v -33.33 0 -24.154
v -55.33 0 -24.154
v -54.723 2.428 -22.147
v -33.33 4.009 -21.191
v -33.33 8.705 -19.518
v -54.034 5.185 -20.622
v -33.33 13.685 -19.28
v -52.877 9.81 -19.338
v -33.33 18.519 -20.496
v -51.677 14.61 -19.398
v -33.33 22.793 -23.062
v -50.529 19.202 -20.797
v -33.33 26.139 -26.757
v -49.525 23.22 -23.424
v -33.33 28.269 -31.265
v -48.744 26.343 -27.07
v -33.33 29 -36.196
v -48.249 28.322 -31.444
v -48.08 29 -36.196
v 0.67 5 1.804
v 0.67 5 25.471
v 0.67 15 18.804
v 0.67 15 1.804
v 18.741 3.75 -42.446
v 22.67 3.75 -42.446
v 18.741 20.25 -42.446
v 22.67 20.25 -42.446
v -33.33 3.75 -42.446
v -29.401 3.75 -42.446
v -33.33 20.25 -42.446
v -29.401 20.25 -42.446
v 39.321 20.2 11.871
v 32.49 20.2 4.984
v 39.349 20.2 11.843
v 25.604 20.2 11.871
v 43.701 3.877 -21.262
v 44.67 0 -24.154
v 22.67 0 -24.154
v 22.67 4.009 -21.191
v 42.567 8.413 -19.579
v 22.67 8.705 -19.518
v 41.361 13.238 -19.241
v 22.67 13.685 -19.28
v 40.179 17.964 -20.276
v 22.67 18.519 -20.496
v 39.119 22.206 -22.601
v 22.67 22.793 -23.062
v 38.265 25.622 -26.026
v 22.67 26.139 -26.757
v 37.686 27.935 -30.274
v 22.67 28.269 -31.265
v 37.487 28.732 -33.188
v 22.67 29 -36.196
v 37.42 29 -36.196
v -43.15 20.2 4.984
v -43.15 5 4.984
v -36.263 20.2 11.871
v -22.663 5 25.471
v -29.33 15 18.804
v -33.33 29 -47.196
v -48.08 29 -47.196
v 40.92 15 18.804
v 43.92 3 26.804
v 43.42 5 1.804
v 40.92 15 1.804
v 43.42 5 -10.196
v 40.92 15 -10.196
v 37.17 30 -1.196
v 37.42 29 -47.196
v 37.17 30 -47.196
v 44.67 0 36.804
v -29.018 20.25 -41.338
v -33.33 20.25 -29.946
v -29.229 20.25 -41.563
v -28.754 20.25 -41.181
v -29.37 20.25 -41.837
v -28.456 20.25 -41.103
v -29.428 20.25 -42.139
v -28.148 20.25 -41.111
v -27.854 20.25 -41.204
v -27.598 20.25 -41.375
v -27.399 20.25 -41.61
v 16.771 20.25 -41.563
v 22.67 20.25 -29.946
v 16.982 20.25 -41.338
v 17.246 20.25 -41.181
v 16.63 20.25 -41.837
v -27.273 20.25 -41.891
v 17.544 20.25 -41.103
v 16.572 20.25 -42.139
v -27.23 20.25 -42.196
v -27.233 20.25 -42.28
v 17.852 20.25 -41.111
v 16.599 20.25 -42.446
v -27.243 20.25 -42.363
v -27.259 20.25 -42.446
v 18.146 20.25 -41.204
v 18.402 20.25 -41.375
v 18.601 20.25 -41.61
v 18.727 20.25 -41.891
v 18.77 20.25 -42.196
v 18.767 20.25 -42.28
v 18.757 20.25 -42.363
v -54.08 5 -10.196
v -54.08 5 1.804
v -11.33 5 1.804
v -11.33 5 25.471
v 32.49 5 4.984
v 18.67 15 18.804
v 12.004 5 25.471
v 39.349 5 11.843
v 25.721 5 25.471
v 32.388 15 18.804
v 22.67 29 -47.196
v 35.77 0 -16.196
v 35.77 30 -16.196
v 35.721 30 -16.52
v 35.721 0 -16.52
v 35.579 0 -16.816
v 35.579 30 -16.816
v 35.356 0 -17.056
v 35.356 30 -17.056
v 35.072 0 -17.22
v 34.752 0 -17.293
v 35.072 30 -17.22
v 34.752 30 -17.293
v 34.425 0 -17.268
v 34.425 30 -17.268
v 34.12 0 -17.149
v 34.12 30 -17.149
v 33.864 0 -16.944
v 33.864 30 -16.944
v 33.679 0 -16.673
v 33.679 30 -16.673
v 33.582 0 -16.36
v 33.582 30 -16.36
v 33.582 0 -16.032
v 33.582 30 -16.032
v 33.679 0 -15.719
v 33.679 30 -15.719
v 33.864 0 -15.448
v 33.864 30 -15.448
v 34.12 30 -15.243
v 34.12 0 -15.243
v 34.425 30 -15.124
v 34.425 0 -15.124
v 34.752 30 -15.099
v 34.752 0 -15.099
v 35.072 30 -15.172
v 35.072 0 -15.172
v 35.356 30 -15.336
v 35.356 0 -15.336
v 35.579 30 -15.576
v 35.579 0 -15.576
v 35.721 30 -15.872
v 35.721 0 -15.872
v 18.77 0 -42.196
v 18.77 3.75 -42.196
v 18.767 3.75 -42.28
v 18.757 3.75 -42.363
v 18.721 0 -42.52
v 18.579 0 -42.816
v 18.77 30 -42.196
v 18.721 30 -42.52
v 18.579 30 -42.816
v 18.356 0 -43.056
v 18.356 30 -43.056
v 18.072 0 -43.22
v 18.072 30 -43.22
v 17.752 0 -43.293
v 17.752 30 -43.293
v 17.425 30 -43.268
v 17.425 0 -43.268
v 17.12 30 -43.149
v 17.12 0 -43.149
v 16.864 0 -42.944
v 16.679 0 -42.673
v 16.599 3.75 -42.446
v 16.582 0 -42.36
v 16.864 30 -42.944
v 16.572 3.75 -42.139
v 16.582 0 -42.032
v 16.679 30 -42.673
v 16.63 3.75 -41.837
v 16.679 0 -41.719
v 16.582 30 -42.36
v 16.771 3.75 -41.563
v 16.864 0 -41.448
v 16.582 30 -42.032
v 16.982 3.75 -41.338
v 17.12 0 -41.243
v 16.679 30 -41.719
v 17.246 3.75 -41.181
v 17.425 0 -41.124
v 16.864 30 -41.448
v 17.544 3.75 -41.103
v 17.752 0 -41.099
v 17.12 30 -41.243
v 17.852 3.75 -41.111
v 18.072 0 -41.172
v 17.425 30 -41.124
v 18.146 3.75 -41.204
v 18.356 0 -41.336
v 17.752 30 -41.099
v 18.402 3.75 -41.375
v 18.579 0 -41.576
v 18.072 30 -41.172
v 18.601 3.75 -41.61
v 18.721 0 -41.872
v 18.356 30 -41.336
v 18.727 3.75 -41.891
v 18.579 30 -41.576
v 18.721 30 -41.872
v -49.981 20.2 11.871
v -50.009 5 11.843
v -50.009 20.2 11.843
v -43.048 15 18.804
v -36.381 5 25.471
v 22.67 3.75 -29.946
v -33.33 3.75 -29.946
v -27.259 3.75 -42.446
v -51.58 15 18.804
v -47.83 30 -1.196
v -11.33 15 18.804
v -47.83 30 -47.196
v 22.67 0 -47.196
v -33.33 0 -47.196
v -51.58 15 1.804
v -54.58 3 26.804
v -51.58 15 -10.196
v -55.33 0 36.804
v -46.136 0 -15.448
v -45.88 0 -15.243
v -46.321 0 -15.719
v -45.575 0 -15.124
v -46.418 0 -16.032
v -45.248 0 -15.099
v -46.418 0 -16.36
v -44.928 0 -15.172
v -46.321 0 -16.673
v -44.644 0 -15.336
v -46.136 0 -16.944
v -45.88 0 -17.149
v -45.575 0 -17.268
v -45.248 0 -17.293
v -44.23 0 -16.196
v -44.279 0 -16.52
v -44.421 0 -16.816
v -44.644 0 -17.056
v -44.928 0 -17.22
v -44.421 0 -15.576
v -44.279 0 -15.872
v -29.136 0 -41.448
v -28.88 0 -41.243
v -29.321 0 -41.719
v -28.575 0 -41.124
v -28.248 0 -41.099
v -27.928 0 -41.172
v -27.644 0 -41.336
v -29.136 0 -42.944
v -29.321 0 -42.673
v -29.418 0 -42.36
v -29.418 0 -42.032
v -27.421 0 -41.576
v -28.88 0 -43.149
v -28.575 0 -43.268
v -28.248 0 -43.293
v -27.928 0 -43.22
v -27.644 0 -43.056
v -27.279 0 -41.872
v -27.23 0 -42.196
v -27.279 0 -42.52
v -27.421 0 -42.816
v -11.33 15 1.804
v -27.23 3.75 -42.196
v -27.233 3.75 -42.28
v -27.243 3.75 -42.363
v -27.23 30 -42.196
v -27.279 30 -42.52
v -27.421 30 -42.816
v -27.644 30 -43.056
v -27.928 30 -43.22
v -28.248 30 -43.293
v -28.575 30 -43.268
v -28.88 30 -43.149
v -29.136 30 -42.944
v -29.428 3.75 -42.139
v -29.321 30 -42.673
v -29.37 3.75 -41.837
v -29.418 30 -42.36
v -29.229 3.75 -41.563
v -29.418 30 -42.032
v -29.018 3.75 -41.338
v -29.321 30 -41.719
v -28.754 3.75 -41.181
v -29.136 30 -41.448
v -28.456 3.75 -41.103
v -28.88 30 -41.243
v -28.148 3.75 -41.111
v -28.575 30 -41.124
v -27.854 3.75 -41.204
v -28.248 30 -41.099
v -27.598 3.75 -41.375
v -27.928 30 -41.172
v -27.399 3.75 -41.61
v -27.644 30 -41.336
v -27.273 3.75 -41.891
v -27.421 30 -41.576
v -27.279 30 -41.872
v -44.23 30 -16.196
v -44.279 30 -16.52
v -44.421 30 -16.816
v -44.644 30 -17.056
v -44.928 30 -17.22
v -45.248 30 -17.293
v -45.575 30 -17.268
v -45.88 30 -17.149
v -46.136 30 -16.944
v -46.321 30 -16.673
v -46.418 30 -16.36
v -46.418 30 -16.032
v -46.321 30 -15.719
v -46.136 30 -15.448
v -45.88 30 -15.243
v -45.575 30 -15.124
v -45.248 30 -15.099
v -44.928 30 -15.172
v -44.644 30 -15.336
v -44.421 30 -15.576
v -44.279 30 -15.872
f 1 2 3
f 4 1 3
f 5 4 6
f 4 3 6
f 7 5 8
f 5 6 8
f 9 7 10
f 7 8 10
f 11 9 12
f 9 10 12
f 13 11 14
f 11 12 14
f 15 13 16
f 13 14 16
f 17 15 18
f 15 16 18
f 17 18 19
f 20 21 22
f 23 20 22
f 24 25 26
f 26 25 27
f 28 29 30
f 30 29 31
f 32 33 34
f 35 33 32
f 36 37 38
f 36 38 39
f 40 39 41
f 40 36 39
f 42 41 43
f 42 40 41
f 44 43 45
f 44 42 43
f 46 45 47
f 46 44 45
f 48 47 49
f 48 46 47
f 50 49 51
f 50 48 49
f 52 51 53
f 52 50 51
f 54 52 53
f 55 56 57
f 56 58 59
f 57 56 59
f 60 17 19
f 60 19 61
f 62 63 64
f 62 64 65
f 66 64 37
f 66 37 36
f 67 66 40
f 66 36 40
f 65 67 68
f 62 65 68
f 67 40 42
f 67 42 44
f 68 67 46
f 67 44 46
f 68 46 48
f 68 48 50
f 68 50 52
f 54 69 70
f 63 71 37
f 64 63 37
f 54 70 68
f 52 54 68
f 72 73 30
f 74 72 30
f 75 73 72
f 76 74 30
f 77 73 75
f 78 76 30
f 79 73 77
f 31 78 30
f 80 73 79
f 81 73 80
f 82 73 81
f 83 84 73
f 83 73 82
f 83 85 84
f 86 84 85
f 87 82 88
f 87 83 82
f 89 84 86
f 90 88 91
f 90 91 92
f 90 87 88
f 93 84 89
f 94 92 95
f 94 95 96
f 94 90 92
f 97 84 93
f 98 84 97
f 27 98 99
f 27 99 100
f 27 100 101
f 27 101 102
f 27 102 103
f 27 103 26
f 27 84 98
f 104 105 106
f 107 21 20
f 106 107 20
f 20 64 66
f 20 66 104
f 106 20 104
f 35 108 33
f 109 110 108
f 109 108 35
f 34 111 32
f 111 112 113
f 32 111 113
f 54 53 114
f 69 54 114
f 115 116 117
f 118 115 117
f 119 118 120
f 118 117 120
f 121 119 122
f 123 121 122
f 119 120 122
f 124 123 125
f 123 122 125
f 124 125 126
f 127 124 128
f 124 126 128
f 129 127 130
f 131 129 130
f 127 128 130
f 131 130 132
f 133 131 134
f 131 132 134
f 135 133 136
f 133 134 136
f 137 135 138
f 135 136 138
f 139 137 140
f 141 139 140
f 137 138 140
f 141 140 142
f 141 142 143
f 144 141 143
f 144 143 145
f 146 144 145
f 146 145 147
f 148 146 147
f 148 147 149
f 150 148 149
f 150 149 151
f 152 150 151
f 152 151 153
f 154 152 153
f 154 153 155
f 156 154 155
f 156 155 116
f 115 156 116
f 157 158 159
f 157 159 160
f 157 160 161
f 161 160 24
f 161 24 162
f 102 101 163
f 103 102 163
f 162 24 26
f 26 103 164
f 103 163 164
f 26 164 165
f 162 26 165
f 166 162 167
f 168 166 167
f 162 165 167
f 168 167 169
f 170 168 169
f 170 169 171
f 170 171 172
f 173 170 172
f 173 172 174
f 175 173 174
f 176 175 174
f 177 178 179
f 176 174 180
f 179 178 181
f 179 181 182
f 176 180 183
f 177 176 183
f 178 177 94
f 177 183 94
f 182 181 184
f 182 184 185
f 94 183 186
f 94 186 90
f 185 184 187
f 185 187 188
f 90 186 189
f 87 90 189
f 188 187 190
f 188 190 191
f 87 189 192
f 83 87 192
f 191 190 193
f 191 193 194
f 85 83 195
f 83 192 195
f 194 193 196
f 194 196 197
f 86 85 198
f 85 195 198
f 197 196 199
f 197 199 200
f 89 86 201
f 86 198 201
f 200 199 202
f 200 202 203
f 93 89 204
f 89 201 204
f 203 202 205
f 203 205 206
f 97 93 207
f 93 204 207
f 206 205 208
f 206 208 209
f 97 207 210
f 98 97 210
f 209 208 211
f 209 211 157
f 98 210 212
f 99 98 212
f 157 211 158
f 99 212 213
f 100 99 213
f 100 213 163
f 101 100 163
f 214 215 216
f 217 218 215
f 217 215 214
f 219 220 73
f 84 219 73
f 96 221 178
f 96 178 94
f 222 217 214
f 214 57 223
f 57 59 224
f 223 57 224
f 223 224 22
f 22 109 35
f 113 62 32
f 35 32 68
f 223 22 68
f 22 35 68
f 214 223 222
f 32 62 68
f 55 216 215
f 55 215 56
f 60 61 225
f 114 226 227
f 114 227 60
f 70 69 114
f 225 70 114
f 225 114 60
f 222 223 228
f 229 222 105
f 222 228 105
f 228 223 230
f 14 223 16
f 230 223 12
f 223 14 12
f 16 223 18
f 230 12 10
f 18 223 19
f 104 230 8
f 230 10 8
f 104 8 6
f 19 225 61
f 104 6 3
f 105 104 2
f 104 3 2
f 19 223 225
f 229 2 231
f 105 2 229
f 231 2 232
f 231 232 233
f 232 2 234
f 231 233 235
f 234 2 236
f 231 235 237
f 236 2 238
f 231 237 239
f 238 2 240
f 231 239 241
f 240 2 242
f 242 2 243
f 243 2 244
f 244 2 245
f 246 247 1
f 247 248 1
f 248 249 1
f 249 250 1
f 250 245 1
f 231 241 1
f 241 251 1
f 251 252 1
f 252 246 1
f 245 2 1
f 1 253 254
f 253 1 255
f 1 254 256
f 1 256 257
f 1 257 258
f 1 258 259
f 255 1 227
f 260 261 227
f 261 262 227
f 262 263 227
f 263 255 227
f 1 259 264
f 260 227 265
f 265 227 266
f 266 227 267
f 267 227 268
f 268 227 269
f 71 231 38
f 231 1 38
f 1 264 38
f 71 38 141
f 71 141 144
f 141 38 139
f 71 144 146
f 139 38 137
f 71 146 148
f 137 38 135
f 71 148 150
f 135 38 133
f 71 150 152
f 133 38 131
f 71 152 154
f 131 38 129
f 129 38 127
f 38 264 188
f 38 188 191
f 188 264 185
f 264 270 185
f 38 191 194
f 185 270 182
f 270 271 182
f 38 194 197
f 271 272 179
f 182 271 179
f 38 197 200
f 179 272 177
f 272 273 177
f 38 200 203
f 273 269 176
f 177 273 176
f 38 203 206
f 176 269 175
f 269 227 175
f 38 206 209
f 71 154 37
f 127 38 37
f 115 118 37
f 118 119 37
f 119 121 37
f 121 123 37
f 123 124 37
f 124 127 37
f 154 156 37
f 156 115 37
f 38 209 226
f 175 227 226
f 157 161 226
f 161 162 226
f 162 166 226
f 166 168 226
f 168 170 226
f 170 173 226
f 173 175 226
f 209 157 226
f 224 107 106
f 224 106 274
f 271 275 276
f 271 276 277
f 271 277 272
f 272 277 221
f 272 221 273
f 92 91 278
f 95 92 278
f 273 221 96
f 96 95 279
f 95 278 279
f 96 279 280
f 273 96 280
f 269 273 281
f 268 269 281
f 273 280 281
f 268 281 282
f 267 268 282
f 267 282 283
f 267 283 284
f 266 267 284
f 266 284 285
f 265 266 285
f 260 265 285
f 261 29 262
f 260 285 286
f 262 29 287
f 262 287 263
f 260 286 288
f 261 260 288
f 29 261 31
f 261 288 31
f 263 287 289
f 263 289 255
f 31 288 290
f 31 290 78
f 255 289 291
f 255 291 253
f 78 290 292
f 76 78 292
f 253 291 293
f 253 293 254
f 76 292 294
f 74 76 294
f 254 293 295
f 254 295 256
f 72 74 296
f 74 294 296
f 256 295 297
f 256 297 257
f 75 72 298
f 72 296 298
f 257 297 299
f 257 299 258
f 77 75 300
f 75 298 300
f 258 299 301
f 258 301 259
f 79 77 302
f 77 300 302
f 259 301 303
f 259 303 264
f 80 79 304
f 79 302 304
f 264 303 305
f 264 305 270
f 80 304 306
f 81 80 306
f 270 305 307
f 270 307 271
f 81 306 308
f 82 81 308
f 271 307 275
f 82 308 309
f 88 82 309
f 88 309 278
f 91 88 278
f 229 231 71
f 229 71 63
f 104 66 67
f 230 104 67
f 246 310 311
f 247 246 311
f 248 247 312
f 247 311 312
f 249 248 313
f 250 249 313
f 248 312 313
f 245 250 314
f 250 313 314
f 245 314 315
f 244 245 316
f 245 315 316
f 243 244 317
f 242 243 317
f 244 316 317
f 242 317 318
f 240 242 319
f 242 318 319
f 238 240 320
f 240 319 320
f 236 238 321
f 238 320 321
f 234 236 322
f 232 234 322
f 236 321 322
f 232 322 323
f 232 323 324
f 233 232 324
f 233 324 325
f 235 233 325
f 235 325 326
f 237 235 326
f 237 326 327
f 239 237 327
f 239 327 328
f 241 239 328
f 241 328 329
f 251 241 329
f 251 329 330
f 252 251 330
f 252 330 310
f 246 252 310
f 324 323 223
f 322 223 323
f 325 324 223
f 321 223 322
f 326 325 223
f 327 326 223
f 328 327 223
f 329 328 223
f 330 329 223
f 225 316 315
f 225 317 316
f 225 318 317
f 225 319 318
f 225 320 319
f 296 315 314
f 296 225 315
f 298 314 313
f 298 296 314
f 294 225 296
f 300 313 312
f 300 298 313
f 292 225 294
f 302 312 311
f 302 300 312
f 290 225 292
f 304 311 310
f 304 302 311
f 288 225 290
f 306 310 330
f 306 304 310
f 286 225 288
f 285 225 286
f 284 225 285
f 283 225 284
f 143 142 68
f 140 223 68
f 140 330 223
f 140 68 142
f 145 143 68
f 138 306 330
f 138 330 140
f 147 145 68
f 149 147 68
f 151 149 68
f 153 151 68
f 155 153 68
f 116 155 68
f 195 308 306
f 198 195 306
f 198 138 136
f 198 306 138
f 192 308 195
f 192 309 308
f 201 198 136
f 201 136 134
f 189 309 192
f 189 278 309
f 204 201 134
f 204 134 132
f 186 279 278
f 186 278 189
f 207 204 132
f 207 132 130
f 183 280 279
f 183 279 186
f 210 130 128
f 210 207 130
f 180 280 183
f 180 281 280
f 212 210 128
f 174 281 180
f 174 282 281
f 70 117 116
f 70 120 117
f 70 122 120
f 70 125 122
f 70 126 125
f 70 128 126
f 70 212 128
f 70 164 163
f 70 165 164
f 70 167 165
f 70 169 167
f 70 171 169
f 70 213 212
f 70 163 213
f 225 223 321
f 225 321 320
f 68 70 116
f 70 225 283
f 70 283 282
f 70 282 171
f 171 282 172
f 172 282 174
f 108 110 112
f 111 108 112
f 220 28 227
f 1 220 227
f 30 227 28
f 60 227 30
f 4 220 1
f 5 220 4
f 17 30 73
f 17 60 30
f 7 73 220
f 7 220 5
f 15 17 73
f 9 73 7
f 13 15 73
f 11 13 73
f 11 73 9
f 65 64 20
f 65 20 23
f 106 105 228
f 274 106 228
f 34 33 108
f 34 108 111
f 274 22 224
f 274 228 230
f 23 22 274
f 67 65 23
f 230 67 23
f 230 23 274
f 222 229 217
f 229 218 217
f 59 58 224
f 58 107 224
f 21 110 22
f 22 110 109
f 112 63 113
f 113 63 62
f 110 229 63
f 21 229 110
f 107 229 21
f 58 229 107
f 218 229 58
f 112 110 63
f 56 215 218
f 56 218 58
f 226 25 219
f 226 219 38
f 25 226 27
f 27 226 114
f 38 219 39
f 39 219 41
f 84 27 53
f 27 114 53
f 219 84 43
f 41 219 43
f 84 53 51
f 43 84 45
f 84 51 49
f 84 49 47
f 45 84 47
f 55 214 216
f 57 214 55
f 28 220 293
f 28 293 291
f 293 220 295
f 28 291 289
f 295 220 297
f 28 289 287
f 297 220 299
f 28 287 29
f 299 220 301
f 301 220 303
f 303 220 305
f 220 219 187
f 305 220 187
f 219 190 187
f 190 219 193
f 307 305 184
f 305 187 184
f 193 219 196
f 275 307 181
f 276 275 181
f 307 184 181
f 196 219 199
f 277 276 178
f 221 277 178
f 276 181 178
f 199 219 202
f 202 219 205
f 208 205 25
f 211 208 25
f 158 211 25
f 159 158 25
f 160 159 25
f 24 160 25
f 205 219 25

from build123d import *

# Parameters (mm, degrees)
IZIM2_W                       = 100
IZIM2_H                       = 90
Y_KSEKLIK_EKSTR_ZYON1_DEPTH   = 30
KES_EKSTR_ZYON11_DEPTH        = 22
KES_EKSTR_ZYON12_DEPTH        = 22
IZIM7_W                       = 12.5
IZIM7_H                       = 16.5
KES_EKSTR_ZYON13_DEPTH        = 70
IZIM8_W                       = 6
IZIM8_H                       = 30
KES_EKSTR_ZYON14_DEPTH        = 100
IZIM9_W                       = 22
IZIM9_H                       = 6
KES_EKSTR_ZYON15_DEPTH        = 100
IZIM10_W                      = 12
IZIM10_H                      = 10
KES_EKSTR_ZYON16_DEPTH        = 100
IZIM11_W                      = 12
IZIM11_H                      = 10
KES_EKSTR_ZYON17_DEPTH        = 45
Y_KSEKLIK_EKSTR_ZYON2_DEPTH   = 45
Y_KSEKLIK_EKSTR_ZYON2_2_DEPTH = 45
IZIM13_W                      = 9.7
IZIM13_H                      = 15.2
KES_EKSTR_ZYON18_DEPTH        = 45
IZIM14_W                      = 9.7
IZIM14_H                      = 15.2
KES_EKSTR_ZYON19_DEPTH        = 45
IZIM15_W                      = 64.648209686
IZIM15_H                      = 50.718484946
KES_EKSTR_ZYON20_DEPTH        = 45
KES_EKSTR_ZYON21_DEPTH        = 100
IZIM17_R                      = 1.1
KES_EKSTR_ZYON24_DEPTH        = 100
KES_EKSTR_ZYON25_DEPTH        = 100


with BuildPart() as part:
    # Çizim2 → Yükseklik-Ekstrüzyon1 (new body)
    with BuildSketch(Plane(origin=(0, 0, 0), x_dir=(1, 0, 0), z_dir=(0, 1, 0))):
        with Locations((-5.3298184, 8.1959709)):
            Rectangle(IZIM2_W, IZIM2_H)
    extrude(amount=Y_KSEKLIK_EKSTR_ZYON1_DEPTH)

    # Çizim5 → Kes-Ekstrüzyon11 (cut)
    with BuildSketch(Plane(origin=(44.6701816, 0, 0), x_dir=(0, 0, -1), z_dir=(1, 0, 0))):
        with BuildLine():
            Line((36.1959709, 29), (53.1959709, 29))
            Line((53.1959709, 29), (53.1959709, 0))
            Line((53.1959709, 0), (24.154376321, 0))
            ThreePointArc((24.154376321, 0), (20.495652432, 18.519202405), (36.1959709, 29))
        make_face()
    extrude(amount=-KES_EKSTR_ZYON11_DEPTH, mode=Mode.SUBTRACT)

    # Çizim6 → Kes-Ekstrüzyon12 (cut)
    with BuildSketch(Plane.ZY.offset(55.3298184)):
        with BuildLine():
            Line((-36.1959709, 29), (-53.1959709, 29))
            Line((-53.1959709, 29), (-53.1959709, 0))
            Line((-53.1959709, 0), (-24.154376321, 0))
            ThreePointArc((-24.154376321, 0), (-20.495652432, 18.519202405), (-36.1959709, 29))
        make_face()
    extrude(amount=-KES_EKSTR_ZYON12_DEPTH, mode=Mode.SUBTRACT)

    # Çizim7 → Kes-Ekstrüzyon13 (cut)
    with BuildSketch(Plane(origin=(22.6701816, 0, 0), x_dir=(0, 0, -1), z_dir=(1, 0, 0))):
        with Locations((36.1959709, 12)):
            Rectangle(IZIM7_W, IZIM7_H)
    extrude(amount=-KES_EKSTR_ZYON13_DEPTH, mode=Mode.SUBTRACT)

    # Çizim8 → Kes-Ekstrüzyon14 (cut)
    with BuildSketch(Plane(origin=(22.6701816, 0, 0), x_dir=(0, 0, -1), z_dir=(1, 0, 0))):
        with Locations((50.1959709, 15)):
            Rectangle(IZIM8_W, IZIM8_H)
    extrude(amount=-KES_EKSTR_ZYON14_DEPTH, mode=Mode.SUBTRACT)

    # Çizim9 → Kes-Ekstrüzyon15 (cut)
    with BuildSketch(Plane(origin=(0, 30, 0), x_dir=(1, 0, 0), z_dir=(0, 1, 0))):
        with Locations((33.6701816, 50.1959709)):
            Rectangle(IZIM9_W, IZIM9_H)
    extrude(amount=-KES_EKSTR_ZYON15_DEPTH, mode=Mode.SUBTRACT)

    # Çizim10 → Kes-Ekstrüzyon16 (cut)
    with BuildSketch(Plane(origin=(44.6701816, 0, 0), x_dir=(0, 0, -1), z_dir=(1, 0, 0))):
        with Locations((4.1959709, 10)):
            Rectangle(IZIM10_W, IZIM10_H)
    extrude(amount=-KES_EKSTR_ZYON16_DEPTH, mode=Mode.SUBTRACT)

    # Çizim11 → Kes-Ekstrüzyon17 (cut)
    with BuildSketch(Plane.XY.offset(36.8040291)):
        with Locations((-5.3298184, 10)):
            Rectangle(IZIM11_W, IZIM11_H)
    extrude(amount=-KES_EKSTR_ZYON17_DEPTH, mode=Mode.SUBTRACT)

    # Çizim13 → Kes-Ekstrüzyon18 (cut)
    with BuildSketch(Plane(origin=(12.73710535, 0, 12.73710535), x_dir=(0.707106781, 0, -0.707106781), z_dir=(0.707106781, 0, 0.707106781))):
        with Locations((-38.885769972, 12.6)):
            Rectangle(IZIM13_W, IZIM13_H)
    extrude(amount=-KES_EKSTR_ZYON18_DEPTH, mode=Mode.SUBTRACT)

    # Çizim14 → Kes-Ekstrüzyon19 (cut)
    with BuildSketch(Plane(origin=(-18.06692375, 0, 18.06692375), x_dir=(0.707106781, 0, 0.707106781), z_dir=(-0.707106781, 0, 0.707106781))):
        with Locations((31.348268505, 12.6)):
            Rectangle(IZIM14_W, IZIM14_H)
    extrude(amount=-KES_EKSTR_ZYON19_DEPTH, mode=Mode.SUBTRACT)

    # Çizim16 → Kes-Ekstrüzyon21 (cut)
    with BuildSketch(Plane(origin=(44.6701816, 0, 0), x_dir=(0, 0, -1), z_dir=(1, 0, 0))):
        Polygon((-36.8040291, 0), (-26.8040291, 3), (-18.8040291, 15), (1.1959709, 30), (-36.8040291, 30), align=None)
    extrude(amount=-KES_EKSTR_ZYON21_DEPTH, mode=Mode.SUBTRACT)

    # Çizim17 → Kes-Ekstrüzyon24 (cut)
    with BuildSketch(Plane(origin=(0, 30, 0), x_dir=(1, 0, 0), z_dir=(0, 1, 0))):
        with Locations((-28.3298184, 42.1959709)):
            Circle(IZIM17_R)
        with Locations((-45.3298184, 16.1959709)):
            Circle(IZIM17_R)
        with Locations((34.6701816, 16.1959709)):
            Circle(IZIM17_R)
        with Locations((17.6701816, 42.1959709)):
            Circle(IZIM17_R)
    extrude(amount=-KES_EKSTR_ZYON24_DEPTH, mode=Mode.SUBTRACT)

    # Çizim19 → Kes-Ekstrüzyon25 (cut)
    with BuildSketch(Plane(origin=(0, 0, -47.1959709), x_dir=(-1, 0, 0), z_dir=(0, 0, -1))):
        Polygon((-44.6701816, 0), (-37.1701816, 30), (-44.6701816, 30), align=None)
        Polygon((55.3298184, 0), (55.3298184, 30), (47.8298184, 30), align=None)
    extrude(amount=-KES_EKSTR_ZYON25_DEPTH, mode=Mode.SUBTRACT)


with BuildPart() as body_2:
    # Çizim12 → Yükseklik-Ekstrüzyon2 (new body)
    with BuildSketch(Plane(origin=(0, 30, 0), x_dir=(1, 0, 0), z_dir=(0, 1, 0))):
        Polygon((-11.3298184, -36.8040291), (-17.233785956, -42.707996656), (-17.233785956, -36.8040291), align=None)
    extrude(amount=Y_KSEKLIK_EKSTR_ZYON2_DEPTH)


with BuildPart() as body_3:
    # Çizim12 → Y_kseklik-Ekstr_zyon2 2 (new body)
    with BuildSketch(Plane(origin=(0, 30, 0), x_dir=(1, 0, 0), z_dir=(0, 1, 0))):
        Polygon((0.6701816, -36.8040291), (4.718486826, -40.852334326), (4.718486826, -36.8040291), align=None)
    extrude(amount=Y_KSEKLIK_EKSTR_ZYON2_2_DEPTH)


with BuildPart() as kes_ekstr_zyon20_tool:
    # Çizim15 → Kes-Ekstrüzyon20 (new body)
    with BuildSketch(Plane(origin=(0, 30, 0), x_dir=(1, 0, 0), z_dir=(0, 1, 0))):
        with Locations((5.316439318, -44.683310577)):
            Rectangle(IZIM15_W, IZIM15_H)
    extrude(amount=KES_EKSTR_ZYON20_DEPTH)


with BuildPart() as body_2_1:
    add(body_2.part)

    # Kes-Ekstrüzyon20: cut by kes_ekstr_zyon20_tool
    add(kes_ekstr_zyon20_tool.part, mode=Mode.SUBTRACT)


with BuildPart() as body_3_1:
    add(body_3.part)

    # Kes-Ekstrüzyon20: cut by kes_ekstr_zyon20_tool
    add(kes_ekstr_zyon20_tool.part, mode=Mode.SUBTRACT)


solid = part.part
